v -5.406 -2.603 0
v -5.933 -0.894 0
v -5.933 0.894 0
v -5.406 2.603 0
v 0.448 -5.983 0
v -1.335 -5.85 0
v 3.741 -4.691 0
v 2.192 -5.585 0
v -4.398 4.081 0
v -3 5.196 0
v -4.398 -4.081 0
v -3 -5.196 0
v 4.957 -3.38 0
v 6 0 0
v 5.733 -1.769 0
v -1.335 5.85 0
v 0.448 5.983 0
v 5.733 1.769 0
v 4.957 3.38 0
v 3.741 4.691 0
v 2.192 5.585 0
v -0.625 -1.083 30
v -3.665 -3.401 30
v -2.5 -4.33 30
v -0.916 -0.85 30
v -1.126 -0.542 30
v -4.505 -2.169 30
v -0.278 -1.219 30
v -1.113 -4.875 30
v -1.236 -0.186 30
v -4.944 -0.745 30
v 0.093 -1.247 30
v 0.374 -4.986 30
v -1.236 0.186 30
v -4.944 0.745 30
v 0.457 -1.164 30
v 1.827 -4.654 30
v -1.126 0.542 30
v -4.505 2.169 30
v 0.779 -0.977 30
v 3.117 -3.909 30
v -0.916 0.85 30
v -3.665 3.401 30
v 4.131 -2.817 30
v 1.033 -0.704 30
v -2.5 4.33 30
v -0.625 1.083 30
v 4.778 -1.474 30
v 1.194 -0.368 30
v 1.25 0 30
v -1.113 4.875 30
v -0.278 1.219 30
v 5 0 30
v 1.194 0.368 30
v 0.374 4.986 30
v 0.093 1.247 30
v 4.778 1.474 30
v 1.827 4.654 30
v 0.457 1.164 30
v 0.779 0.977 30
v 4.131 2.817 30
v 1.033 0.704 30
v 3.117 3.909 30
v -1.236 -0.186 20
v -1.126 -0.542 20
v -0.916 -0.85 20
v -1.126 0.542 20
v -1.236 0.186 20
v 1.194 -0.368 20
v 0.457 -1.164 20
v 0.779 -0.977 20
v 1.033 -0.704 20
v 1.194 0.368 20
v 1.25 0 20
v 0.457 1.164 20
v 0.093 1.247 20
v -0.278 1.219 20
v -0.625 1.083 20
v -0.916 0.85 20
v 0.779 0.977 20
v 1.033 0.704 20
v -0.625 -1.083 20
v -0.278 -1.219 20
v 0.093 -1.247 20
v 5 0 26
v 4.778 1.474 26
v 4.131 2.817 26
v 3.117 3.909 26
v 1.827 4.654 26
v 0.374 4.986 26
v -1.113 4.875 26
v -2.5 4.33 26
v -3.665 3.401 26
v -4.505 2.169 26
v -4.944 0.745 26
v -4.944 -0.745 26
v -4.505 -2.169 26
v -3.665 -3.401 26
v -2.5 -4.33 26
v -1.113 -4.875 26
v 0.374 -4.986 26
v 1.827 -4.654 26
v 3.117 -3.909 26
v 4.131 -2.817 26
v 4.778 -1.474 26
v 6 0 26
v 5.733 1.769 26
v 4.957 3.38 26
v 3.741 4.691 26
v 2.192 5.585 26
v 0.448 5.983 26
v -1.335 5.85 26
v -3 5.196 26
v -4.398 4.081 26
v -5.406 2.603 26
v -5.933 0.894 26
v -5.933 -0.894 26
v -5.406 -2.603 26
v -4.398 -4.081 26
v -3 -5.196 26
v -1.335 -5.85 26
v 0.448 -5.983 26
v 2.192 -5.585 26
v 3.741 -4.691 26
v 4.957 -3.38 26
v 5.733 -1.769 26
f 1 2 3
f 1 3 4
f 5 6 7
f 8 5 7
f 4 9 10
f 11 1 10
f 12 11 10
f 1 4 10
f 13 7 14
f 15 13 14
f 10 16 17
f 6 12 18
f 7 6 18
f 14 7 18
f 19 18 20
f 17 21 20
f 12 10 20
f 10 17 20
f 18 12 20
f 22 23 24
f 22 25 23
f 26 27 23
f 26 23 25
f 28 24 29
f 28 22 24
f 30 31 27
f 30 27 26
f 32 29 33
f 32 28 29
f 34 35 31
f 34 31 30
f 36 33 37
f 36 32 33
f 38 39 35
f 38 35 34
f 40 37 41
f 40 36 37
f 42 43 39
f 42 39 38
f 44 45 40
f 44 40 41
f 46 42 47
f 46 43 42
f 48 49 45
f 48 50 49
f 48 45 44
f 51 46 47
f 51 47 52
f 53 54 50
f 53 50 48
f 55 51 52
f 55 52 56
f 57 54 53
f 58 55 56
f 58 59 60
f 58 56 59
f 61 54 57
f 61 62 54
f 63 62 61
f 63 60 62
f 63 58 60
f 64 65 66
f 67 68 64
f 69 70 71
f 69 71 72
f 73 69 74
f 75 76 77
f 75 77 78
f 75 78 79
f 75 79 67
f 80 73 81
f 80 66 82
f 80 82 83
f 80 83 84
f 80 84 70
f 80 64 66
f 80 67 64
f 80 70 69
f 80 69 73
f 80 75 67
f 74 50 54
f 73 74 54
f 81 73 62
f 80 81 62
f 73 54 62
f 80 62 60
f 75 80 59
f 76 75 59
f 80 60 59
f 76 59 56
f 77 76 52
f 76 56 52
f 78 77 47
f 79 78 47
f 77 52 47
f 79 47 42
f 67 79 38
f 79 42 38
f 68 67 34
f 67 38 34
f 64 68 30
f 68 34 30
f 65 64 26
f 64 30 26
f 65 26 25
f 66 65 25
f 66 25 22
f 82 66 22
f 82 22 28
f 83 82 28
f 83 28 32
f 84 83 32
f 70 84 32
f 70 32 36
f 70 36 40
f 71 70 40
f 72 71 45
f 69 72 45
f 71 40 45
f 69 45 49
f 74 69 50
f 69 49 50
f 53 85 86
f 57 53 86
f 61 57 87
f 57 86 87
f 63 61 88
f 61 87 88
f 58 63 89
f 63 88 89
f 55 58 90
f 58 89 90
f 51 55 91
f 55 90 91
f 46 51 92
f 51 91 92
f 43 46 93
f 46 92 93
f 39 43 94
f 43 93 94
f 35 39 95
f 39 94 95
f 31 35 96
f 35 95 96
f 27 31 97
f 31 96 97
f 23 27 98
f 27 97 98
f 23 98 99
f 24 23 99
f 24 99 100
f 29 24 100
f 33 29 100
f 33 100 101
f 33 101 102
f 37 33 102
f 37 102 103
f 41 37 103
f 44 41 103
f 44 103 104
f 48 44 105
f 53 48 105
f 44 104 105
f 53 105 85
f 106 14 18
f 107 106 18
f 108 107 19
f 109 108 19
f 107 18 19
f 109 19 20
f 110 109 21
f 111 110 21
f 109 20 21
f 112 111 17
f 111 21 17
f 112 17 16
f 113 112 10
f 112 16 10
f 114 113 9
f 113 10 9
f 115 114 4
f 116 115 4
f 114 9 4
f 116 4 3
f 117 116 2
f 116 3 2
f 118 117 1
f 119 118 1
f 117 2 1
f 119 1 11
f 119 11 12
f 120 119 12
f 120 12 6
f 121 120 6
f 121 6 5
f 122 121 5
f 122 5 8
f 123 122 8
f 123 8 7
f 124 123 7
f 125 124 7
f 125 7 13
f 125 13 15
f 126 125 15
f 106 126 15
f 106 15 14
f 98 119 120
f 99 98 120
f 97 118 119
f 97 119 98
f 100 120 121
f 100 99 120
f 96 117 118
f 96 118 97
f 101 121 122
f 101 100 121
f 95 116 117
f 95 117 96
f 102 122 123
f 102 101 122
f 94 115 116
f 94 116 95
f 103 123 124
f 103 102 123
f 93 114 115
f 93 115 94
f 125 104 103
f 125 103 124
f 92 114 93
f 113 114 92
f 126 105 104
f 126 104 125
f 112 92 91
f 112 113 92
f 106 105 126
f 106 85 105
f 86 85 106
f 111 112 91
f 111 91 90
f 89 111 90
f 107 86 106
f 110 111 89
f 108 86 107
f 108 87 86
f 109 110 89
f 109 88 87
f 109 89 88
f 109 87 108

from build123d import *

# Parameters (mm, degrees)
SKETCH_1_R          = 6
EXTRUDE_1_DEPTH     = 30
CUT_EXTRUDE_START   = -4
SKETCH_2_R          = 6
SKETCH_2_R_2        = 5
CUT_EXTRUDE_1_DEPTH = 4
SKETCH_3_R          = 1.25
CUT_EXTRUDE_2_DEPTH = 10


with BuildPart() as part:
    # ｽｹｯﾁ1 → ﾎﾞｽ - 押し出し1 (new body)
    with BuildSketch(Plane.XY):
        Circle(SKETCH_1_R)
    extrude(amount=EXTRUDE_1_DEPTH)

    # ｽｹｯﾁ2 → ｶｯﾄ - 押し出し1 (cut)
    with BuildSketch(Plane.XY.offset(30).offset(CUT_EXTRUDE_START)):
        Circle(SKETCH_2_R)
        Circle(SKETCH_2_R_2, mode=Mode.SUBTRACT)
    extrude(amount=CUT_EXTRUDE_1_DEPTH, mode=Mode.SUBTRACT)

    # ｽｹｯﾁ3 → ｶｯﾄ - 押し出し2 (cut)
    with BuildSketch(Plane.XY.offset(30)):
        Circle(SKETCH_3_R)
    extrude(amount=-CUT_EXTRUDE_2_DEPTH, mode=Mode.SUBTRACT)


solid = part.part
